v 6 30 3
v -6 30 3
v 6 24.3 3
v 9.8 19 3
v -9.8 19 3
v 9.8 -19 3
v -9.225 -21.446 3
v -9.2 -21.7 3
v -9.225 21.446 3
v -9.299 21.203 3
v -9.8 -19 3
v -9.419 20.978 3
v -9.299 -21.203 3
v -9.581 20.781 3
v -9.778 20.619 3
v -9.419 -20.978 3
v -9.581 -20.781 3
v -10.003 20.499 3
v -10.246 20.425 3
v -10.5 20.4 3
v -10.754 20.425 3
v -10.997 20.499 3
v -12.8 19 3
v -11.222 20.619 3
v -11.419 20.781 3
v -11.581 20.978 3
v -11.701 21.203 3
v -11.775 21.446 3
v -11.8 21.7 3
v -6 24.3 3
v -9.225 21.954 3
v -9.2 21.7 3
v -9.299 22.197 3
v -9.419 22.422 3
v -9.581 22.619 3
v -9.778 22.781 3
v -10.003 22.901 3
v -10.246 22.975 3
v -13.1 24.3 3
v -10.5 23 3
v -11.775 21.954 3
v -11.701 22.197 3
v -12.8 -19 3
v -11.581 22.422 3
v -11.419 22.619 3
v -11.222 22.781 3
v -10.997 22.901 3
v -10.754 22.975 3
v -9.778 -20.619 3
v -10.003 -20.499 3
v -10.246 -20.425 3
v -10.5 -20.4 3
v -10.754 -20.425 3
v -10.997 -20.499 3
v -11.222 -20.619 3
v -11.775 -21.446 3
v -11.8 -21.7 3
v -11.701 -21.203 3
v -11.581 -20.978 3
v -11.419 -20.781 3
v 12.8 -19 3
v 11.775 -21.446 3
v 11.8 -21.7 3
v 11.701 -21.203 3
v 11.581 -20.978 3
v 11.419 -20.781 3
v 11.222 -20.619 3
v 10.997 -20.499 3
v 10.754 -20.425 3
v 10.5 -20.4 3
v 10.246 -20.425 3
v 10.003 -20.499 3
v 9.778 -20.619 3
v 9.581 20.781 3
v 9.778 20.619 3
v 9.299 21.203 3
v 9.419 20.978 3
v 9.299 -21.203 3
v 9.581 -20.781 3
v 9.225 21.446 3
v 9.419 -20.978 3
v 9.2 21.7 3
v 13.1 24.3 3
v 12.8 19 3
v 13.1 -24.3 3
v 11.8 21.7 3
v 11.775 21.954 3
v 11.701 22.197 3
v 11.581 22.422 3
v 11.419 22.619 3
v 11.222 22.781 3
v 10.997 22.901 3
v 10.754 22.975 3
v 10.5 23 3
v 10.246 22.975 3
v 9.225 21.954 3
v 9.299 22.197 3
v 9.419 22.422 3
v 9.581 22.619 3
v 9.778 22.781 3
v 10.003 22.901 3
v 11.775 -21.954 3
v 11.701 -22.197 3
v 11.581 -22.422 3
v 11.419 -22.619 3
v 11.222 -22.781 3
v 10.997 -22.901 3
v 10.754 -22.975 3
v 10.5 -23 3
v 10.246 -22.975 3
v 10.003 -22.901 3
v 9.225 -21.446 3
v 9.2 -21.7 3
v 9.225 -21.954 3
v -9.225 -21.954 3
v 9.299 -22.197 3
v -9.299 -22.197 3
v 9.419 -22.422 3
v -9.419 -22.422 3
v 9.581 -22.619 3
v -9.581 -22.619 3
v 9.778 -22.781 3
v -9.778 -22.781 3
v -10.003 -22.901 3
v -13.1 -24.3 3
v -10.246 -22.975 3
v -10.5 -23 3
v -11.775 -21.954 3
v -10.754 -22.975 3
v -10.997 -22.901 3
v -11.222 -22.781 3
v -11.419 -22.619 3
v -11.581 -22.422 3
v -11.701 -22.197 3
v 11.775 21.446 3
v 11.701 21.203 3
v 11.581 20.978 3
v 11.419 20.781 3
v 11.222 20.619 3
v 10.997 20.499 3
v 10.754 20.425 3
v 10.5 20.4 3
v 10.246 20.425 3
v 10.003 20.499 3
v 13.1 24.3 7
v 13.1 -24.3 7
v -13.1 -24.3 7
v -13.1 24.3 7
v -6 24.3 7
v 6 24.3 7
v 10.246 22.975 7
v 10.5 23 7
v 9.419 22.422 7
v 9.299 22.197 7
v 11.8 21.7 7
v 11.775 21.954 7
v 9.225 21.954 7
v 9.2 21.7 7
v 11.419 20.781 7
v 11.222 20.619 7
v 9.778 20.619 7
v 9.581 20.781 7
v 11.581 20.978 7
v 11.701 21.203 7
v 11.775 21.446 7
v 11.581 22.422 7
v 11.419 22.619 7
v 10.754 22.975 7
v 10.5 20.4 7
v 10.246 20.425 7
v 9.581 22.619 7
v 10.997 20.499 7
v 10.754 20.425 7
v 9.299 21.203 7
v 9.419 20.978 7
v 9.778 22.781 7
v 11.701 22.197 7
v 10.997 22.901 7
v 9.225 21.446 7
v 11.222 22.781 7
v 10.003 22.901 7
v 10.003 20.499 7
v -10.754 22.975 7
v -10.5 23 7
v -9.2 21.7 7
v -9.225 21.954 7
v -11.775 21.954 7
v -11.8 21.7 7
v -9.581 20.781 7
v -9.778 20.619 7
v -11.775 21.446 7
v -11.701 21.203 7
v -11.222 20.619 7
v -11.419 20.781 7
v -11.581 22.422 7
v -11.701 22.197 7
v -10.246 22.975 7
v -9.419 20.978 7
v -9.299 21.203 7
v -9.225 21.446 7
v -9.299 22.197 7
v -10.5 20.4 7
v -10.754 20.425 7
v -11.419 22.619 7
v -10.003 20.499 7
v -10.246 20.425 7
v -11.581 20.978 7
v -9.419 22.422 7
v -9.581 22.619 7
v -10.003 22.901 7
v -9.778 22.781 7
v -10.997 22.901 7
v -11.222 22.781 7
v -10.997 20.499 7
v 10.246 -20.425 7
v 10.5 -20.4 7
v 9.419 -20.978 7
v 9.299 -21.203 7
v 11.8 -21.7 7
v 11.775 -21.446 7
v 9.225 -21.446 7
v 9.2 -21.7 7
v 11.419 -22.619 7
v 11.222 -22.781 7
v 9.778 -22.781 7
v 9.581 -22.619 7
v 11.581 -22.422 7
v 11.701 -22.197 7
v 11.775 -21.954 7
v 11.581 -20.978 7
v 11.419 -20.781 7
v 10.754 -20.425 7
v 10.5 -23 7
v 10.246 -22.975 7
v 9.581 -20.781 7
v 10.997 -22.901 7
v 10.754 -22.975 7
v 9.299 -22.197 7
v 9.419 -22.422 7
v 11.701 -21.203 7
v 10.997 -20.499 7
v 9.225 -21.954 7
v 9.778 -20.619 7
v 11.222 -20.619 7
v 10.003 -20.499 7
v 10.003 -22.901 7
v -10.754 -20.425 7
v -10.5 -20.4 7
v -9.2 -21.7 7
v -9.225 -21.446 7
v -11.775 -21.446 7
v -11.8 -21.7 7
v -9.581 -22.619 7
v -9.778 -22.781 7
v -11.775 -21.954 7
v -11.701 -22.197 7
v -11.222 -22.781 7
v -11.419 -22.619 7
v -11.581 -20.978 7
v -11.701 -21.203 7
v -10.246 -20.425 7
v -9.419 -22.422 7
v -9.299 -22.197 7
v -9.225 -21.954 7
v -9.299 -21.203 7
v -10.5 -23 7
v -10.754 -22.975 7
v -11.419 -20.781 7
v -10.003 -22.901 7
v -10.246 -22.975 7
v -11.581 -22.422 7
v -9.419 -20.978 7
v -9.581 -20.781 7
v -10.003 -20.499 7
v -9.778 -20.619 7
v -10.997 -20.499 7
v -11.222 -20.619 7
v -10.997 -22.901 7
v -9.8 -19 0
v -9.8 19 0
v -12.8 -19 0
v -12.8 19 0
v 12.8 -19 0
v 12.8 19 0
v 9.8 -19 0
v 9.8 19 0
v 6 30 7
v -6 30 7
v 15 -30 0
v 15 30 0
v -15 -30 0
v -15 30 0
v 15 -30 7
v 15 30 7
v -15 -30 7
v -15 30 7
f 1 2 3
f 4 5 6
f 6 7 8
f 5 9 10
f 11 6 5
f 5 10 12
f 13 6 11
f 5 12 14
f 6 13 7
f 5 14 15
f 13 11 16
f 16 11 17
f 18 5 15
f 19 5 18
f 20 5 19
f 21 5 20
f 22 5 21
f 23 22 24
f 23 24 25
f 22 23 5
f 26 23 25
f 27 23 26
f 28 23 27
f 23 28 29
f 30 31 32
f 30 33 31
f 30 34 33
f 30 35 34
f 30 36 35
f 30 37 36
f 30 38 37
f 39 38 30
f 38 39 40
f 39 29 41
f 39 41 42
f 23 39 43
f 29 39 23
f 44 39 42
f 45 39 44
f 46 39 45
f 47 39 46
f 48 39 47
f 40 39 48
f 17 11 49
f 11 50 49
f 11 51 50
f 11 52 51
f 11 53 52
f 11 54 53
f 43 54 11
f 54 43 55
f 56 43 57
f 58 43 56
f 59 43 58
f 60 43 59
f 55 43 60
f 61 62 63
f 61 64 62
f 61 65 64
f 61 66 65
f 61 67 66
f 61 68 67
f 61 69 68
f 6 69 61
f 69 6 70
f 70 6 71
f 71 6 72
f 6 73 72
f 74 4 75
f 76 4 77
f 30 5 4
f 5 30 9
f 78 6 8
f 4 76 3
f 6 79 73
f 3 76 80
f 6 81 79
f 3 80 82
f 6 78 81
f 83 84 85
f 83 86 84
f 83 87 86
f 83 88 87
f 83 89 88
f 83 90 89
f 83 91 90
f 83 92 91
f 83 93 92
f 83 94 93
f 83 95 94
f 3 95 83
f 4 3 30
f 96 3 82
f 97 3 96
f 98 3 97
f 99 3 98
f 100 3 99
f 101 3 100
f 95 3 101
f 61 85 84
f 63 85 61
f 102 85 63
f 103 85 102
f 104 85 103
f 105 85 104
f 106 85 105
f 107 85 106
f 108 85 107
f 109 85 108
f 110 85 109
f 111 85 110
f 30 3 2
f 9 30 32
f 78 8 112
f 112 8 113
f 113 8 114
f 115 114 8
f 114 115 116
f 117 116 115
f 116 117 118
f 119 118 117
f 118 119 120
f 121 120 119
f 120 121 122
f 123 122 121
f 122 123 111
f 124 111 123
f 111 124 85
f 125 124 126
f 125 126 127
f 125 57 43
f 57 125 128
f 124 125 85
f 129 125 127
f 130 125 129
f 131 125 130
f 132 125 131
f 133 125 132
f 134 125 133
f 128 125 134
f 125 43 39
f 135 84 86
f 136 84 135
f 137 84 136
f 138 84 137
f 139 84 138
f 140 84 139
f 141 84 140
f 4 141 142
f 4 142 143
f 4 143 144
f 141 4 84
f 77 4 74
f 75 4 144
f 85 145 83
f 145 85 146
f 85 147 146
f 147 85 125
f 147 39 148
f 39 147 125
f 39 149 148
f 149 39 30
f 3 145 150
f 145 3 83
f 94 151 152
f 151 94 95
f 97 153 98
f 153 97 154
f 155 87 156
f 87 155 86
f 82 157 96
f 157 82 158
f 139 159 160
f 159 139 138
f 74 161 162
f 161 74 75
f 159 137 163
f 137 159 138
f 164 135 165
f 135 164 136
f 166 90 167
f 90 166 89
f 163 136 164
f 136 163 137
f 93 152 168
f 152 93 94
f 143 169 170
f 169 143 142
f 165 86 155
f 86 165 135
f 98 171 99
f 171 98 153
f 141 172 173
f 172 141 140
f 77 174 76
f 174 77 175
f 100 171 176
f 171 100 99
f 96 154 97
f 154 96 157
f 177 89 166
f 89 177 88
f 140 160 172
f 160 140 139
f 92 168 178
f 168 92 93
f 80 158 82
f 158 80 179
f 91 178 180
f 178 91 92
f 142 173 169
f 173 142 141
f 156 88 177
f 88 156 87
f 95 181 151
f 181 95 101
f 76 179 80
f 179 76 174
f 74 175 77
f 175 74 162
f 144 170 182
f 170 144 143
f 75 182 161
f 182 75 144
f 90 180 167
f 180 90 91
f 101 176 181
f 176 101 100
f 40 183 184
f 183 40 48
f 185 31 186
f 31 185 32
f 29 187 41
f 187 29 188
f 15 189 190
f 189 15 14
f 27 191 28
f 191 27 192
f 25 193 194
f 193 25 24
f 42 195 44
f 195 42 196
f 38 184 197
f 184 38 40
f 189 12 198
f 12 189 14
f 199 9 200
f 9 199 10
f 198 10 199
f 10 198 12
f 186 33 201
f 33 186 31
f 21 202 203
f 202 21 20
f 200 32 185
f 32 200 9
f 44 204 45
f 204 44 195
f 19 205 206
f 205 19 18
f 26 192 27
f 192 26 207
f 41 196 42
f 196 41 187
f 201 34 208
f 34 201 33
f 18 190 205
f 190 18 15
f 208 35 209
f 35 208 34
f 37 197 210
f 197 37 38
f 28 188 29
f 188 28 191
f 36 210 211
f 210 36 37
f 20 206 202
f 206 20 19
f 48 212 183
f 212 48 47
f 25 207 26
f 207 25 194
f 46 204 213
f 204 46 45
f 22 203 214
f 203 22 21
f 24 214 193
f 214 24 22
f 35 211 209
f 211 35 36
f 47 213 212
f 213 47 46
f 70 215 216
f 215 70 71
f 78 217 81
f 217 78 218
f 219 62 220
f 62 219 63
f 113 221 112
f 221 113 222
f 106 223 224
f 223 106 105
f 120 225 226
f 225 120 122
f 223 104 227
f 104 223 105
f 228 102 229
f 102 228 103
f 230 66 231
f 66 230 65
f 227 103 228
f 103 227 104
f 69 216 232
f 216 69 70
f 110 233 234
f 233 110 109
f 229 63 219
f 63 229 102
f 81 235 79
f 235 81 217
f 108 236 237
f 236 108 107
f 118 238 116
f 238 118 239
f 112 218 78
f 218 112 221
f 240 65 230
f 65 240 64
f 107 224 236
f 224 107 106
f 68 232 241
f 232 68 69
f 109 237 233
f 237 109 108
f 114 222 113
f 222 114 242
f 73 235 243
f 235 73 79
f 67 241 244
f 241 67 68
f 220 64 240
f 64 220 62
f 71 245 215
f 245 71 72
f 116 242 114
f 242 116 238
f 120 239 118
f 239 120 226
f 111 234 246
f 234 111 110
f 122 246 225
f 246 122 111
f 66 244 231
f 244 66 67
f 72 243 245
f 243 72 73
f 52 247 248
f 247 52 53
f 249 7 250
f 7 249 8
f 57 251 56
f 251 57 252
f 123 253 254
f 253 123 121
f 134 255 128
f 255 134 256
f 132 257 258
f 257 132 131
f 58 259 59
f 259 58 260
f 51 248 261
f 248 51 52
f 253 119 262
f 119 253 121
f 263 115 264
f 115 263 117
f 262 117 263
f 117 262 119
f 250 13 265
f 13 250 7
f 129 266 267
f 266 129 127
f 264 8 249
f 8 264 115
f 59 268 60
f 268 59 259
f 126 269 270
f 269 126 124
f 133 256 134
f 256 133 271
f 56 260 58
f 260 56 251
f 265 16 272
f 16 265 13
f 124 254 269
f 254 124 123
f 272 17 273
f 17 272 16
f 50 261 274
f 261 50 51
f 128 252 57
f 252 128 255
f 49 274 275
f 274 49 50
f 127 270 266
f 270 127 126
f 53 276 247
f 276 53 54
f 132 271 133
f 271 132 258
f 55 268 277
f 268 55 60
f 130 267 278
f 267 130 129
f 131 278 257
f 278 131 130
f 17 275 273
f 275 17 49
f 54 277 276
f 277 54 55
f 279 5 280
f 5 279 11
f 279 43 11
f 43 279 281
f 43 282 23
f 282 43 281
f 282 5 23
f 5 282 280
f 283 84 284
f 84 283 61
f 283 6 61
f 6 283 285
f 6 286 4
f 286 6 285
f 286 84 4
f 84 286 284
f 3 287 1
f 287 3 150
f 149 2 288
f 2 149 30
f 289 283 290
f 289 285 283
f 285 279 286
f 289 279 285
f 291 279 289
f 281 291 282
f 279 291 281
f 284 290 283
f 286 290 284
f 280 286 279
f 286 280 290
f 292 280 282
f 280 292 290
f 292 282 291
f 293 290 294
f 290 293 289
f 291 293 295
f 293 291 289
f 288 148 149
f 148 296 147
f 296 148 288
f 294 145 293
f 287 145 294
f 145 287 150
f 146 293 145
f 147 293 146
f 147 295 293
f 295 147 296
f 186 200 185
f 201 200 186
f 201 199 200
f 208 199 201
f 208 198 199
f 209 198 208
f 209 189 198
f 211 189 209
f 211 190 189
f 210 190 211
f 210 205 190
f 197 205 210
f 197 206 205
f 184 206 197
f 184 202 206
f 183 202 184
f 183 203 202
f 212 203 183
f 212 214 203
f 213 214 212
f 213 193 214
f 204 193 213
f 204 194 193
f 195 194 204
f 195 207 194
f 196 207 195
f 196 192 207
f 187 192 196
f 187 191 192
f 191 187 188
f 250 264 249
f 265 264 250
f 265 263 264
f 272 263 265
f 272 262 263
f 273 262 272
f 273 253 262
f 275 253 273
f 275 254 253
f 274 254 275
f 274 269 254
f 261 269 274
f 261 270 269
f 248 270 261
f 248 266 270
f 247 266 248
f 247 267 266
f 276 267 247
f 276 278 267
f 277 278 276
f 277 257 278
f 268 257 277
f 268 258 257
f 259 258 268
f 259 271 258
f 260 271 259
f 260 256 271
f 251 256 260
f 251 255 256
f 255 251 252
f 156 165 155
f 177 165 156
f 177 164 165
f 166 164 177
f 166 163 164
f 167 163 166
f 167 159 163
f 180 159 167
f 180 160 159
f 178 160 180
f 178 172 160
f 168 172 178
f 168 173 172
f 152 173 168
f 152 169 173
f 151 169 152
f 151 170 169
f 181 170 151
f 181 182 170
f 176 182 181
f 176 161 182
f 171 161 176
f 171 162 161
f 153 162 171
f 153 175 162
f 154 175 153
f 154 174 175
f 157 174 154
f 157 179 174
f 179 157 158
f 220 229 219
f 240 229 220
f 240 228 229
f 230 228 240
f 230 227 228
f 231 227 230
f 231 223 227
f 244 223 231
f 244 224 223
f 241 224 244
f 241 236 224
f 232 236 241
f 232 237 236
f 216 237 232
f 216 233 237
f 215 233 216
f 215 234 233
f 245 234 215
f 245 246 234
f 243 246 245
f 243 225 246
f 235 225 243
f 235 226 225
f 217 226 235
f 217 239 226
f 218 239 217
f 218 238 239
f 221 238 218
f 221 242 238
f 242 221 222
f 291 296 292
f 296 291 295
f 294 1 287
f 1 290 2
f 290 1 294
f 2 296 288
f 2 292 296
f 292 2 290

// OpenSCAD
difference()
{
    linear_extrude(height = 7.0, twist = 0.0, scale = 1.0, slices = 1, center = false)
    {
        scale([30.0, 60.0])
        {
            M8();
        }
    }
    translate([0.0, 0.0, 3.0])
    {
        union()
        {
            union()
            {
                difference()
                {
                    linear_extrude(height = 6.0, twist = 0.0, scale = 1.0, slices = 1, center = false)
                    {
                        scale([26.2, 48.6])
                        {
                            M8();
                        }
                    }
                    translate([10.5, 21.7, 0.0])
                    {
                        translate([0.0, 0.0, -1.0])
                        {
                            linear_extrude(height = 8.0, twist = 0.0, scale = 1.0, slices = 1, center = false)
                            {
                                scale([2.6, 2.6])
                                {
                                    M52();
                                }
                            }
                        }
                    }
                    translate([-10.5, 21.7, 0.0])
                    {
                        translate([0.0, 0.0, -1.0])
                        {
                            linear_extrude(height = 8.0, twist = 0.0, scale = 1.0, slices = 1, center = false)
                            {
                                scale([2.6, 2.6])
                                {
                                    M52();
                                }
                            }
                        }
                    }
                    translate([10.5, -21.7, 0.0])
                    {
                        translate([0.0, 0.0, -1.0])
                        {
                            linear_extrude(height = 8.0, twist = 0.0, scale = 1.0, slices = 1, center = false)
                            {
                                scale([2.6, 2.6])
                                {
                                    M52();
                                }
                            }
                        }
                    }
                    translate([-10.5, -21.7, 0.0])
                    {
                        translate([0.0, 0.0, -1.0])
                        {
                            linear_extrude(height = 8.0, twist = 0.0, scale = 1.0, slices = 1, center = false)
                            {
                                scale([2.6, 2.6])
                                {
                                    M52();
                                }
                            }
                        }
                    }
                }
                translate([-11.3, 0.0, 0.0])
                {
                    translate([0.0, 0.0, -10.0])
                    {
                        linear_extrude(height = 11.0, twist = 0.0, scale = 1.0, slices = 1, center = false)
                        {
                            scale([3.0, 38.0])
                            {
                                M8();
                            }
                        }
                    }
                }
                translate([11.3, 0.0, 0.0])
                {
                    translate([0.0, 0.0, -10.0])
                    {
                        linear_extrude(height = 11.0, twist = 0.0, scale = 1.0, slices = 1, center = false)
                        {
                            scale([3.0, 38.0])
                            {
                                M8();
                            }
                        }
                    }
                }
            }
            translate([0.0, 33.8, 0.0])
            {
                translate([0.0, 0.0, 0.0])
                {
                    linear_extrude(height = 6.0, twist = 0.0, scale = 1.0, slices = 1, center = false)
                    {
                        scale([12.0, 21.0])
                        {
                            M8();
                        }
                    }
                }
            }
        }
    }
}

module M52()
{
    polygon
    (
        points =
        [
            [0.5, 0.0], 
            [0.4903926402016152, 0.09754516100806412], 
            [0.46193976625564337, 0.1913417161825449], 
            [0.4157348061512726, 0.2777851165098011], 
            [0.3535533905932738, 0.35355339059327373], 
            [0.27778511650980114, 0.4157348061512726], 
            [0.19134171618254492, 0.46193976625564337], 
            [0.09754516100806417, 0.4903926402016152], 
            [3.061616997868383E-17, 0.5], 
            [-0.0975451610080641, 0.4903926402016152], 
            [-0.19134171618254486, 0.46193976625564337], 
            [-0.277785116509801, 0.41573480615127273], 
            [-0.35355339059327373, 0.3535533905932738], 
            [-0.4157348061512727, 0.2777851165098011], 
            [-0.46193976625564337, 0.19134171618254495], 
            [-0.4903926402016152, 0.0975451610080643], 
            [-0.5, 6.123233995736766E-17], 
            [-0.4903926402016152, -0.09754516100806418], 
            [-0.4619397662556434, -0.19134171618254484], 
            [-0.41573480615127273, -0.277785116509801], 
            [-0.35355339059327384, -0.35355339059327373], 
            [-0.2777851165098011, -0.4157348061512726], 
            [-0.19134171618254517, -0.46193976625564326], 
            [-0.09754516100806433, -0.49039264020161516], 
            [-9.184850993605148E-17, -0.5], 
            [0.09754516100806415, -0.4903926402016152], 
            [0.191341716182545, -0.4619397662556433], 
            [0.2777851165098009, -0.41573480615127273], 
            [0.3535533905932737, -0.35355339059327384], 
            [0.4157348061512726, -0.2777851165098011], 
            [0.46193976625564326, -0.1913417161825452], 
            [0.49039264020161516, -0.09754516100806436]
        ],
        paths =
        [
            [0, 1, 2, 3, 4, 5, 6, 7, 8, 9, 10, 11, 12, 13, 14, 15, 16, 17, 18, 19, 20, 21, 22, 23, 24, 25, 26, 27, 28, 29, 30, 31]
        ]
    );
}

module M8()
{
    polygon
    (
        points =
        [
            [-0.5, -0.5], 
            [0.5, -0.5], 
            [0.5, 0.5], 
            [-0.5, 0.5]
        ],
        paths =
        [
            [0, 1, 2, 3]
        ]
    );
}
